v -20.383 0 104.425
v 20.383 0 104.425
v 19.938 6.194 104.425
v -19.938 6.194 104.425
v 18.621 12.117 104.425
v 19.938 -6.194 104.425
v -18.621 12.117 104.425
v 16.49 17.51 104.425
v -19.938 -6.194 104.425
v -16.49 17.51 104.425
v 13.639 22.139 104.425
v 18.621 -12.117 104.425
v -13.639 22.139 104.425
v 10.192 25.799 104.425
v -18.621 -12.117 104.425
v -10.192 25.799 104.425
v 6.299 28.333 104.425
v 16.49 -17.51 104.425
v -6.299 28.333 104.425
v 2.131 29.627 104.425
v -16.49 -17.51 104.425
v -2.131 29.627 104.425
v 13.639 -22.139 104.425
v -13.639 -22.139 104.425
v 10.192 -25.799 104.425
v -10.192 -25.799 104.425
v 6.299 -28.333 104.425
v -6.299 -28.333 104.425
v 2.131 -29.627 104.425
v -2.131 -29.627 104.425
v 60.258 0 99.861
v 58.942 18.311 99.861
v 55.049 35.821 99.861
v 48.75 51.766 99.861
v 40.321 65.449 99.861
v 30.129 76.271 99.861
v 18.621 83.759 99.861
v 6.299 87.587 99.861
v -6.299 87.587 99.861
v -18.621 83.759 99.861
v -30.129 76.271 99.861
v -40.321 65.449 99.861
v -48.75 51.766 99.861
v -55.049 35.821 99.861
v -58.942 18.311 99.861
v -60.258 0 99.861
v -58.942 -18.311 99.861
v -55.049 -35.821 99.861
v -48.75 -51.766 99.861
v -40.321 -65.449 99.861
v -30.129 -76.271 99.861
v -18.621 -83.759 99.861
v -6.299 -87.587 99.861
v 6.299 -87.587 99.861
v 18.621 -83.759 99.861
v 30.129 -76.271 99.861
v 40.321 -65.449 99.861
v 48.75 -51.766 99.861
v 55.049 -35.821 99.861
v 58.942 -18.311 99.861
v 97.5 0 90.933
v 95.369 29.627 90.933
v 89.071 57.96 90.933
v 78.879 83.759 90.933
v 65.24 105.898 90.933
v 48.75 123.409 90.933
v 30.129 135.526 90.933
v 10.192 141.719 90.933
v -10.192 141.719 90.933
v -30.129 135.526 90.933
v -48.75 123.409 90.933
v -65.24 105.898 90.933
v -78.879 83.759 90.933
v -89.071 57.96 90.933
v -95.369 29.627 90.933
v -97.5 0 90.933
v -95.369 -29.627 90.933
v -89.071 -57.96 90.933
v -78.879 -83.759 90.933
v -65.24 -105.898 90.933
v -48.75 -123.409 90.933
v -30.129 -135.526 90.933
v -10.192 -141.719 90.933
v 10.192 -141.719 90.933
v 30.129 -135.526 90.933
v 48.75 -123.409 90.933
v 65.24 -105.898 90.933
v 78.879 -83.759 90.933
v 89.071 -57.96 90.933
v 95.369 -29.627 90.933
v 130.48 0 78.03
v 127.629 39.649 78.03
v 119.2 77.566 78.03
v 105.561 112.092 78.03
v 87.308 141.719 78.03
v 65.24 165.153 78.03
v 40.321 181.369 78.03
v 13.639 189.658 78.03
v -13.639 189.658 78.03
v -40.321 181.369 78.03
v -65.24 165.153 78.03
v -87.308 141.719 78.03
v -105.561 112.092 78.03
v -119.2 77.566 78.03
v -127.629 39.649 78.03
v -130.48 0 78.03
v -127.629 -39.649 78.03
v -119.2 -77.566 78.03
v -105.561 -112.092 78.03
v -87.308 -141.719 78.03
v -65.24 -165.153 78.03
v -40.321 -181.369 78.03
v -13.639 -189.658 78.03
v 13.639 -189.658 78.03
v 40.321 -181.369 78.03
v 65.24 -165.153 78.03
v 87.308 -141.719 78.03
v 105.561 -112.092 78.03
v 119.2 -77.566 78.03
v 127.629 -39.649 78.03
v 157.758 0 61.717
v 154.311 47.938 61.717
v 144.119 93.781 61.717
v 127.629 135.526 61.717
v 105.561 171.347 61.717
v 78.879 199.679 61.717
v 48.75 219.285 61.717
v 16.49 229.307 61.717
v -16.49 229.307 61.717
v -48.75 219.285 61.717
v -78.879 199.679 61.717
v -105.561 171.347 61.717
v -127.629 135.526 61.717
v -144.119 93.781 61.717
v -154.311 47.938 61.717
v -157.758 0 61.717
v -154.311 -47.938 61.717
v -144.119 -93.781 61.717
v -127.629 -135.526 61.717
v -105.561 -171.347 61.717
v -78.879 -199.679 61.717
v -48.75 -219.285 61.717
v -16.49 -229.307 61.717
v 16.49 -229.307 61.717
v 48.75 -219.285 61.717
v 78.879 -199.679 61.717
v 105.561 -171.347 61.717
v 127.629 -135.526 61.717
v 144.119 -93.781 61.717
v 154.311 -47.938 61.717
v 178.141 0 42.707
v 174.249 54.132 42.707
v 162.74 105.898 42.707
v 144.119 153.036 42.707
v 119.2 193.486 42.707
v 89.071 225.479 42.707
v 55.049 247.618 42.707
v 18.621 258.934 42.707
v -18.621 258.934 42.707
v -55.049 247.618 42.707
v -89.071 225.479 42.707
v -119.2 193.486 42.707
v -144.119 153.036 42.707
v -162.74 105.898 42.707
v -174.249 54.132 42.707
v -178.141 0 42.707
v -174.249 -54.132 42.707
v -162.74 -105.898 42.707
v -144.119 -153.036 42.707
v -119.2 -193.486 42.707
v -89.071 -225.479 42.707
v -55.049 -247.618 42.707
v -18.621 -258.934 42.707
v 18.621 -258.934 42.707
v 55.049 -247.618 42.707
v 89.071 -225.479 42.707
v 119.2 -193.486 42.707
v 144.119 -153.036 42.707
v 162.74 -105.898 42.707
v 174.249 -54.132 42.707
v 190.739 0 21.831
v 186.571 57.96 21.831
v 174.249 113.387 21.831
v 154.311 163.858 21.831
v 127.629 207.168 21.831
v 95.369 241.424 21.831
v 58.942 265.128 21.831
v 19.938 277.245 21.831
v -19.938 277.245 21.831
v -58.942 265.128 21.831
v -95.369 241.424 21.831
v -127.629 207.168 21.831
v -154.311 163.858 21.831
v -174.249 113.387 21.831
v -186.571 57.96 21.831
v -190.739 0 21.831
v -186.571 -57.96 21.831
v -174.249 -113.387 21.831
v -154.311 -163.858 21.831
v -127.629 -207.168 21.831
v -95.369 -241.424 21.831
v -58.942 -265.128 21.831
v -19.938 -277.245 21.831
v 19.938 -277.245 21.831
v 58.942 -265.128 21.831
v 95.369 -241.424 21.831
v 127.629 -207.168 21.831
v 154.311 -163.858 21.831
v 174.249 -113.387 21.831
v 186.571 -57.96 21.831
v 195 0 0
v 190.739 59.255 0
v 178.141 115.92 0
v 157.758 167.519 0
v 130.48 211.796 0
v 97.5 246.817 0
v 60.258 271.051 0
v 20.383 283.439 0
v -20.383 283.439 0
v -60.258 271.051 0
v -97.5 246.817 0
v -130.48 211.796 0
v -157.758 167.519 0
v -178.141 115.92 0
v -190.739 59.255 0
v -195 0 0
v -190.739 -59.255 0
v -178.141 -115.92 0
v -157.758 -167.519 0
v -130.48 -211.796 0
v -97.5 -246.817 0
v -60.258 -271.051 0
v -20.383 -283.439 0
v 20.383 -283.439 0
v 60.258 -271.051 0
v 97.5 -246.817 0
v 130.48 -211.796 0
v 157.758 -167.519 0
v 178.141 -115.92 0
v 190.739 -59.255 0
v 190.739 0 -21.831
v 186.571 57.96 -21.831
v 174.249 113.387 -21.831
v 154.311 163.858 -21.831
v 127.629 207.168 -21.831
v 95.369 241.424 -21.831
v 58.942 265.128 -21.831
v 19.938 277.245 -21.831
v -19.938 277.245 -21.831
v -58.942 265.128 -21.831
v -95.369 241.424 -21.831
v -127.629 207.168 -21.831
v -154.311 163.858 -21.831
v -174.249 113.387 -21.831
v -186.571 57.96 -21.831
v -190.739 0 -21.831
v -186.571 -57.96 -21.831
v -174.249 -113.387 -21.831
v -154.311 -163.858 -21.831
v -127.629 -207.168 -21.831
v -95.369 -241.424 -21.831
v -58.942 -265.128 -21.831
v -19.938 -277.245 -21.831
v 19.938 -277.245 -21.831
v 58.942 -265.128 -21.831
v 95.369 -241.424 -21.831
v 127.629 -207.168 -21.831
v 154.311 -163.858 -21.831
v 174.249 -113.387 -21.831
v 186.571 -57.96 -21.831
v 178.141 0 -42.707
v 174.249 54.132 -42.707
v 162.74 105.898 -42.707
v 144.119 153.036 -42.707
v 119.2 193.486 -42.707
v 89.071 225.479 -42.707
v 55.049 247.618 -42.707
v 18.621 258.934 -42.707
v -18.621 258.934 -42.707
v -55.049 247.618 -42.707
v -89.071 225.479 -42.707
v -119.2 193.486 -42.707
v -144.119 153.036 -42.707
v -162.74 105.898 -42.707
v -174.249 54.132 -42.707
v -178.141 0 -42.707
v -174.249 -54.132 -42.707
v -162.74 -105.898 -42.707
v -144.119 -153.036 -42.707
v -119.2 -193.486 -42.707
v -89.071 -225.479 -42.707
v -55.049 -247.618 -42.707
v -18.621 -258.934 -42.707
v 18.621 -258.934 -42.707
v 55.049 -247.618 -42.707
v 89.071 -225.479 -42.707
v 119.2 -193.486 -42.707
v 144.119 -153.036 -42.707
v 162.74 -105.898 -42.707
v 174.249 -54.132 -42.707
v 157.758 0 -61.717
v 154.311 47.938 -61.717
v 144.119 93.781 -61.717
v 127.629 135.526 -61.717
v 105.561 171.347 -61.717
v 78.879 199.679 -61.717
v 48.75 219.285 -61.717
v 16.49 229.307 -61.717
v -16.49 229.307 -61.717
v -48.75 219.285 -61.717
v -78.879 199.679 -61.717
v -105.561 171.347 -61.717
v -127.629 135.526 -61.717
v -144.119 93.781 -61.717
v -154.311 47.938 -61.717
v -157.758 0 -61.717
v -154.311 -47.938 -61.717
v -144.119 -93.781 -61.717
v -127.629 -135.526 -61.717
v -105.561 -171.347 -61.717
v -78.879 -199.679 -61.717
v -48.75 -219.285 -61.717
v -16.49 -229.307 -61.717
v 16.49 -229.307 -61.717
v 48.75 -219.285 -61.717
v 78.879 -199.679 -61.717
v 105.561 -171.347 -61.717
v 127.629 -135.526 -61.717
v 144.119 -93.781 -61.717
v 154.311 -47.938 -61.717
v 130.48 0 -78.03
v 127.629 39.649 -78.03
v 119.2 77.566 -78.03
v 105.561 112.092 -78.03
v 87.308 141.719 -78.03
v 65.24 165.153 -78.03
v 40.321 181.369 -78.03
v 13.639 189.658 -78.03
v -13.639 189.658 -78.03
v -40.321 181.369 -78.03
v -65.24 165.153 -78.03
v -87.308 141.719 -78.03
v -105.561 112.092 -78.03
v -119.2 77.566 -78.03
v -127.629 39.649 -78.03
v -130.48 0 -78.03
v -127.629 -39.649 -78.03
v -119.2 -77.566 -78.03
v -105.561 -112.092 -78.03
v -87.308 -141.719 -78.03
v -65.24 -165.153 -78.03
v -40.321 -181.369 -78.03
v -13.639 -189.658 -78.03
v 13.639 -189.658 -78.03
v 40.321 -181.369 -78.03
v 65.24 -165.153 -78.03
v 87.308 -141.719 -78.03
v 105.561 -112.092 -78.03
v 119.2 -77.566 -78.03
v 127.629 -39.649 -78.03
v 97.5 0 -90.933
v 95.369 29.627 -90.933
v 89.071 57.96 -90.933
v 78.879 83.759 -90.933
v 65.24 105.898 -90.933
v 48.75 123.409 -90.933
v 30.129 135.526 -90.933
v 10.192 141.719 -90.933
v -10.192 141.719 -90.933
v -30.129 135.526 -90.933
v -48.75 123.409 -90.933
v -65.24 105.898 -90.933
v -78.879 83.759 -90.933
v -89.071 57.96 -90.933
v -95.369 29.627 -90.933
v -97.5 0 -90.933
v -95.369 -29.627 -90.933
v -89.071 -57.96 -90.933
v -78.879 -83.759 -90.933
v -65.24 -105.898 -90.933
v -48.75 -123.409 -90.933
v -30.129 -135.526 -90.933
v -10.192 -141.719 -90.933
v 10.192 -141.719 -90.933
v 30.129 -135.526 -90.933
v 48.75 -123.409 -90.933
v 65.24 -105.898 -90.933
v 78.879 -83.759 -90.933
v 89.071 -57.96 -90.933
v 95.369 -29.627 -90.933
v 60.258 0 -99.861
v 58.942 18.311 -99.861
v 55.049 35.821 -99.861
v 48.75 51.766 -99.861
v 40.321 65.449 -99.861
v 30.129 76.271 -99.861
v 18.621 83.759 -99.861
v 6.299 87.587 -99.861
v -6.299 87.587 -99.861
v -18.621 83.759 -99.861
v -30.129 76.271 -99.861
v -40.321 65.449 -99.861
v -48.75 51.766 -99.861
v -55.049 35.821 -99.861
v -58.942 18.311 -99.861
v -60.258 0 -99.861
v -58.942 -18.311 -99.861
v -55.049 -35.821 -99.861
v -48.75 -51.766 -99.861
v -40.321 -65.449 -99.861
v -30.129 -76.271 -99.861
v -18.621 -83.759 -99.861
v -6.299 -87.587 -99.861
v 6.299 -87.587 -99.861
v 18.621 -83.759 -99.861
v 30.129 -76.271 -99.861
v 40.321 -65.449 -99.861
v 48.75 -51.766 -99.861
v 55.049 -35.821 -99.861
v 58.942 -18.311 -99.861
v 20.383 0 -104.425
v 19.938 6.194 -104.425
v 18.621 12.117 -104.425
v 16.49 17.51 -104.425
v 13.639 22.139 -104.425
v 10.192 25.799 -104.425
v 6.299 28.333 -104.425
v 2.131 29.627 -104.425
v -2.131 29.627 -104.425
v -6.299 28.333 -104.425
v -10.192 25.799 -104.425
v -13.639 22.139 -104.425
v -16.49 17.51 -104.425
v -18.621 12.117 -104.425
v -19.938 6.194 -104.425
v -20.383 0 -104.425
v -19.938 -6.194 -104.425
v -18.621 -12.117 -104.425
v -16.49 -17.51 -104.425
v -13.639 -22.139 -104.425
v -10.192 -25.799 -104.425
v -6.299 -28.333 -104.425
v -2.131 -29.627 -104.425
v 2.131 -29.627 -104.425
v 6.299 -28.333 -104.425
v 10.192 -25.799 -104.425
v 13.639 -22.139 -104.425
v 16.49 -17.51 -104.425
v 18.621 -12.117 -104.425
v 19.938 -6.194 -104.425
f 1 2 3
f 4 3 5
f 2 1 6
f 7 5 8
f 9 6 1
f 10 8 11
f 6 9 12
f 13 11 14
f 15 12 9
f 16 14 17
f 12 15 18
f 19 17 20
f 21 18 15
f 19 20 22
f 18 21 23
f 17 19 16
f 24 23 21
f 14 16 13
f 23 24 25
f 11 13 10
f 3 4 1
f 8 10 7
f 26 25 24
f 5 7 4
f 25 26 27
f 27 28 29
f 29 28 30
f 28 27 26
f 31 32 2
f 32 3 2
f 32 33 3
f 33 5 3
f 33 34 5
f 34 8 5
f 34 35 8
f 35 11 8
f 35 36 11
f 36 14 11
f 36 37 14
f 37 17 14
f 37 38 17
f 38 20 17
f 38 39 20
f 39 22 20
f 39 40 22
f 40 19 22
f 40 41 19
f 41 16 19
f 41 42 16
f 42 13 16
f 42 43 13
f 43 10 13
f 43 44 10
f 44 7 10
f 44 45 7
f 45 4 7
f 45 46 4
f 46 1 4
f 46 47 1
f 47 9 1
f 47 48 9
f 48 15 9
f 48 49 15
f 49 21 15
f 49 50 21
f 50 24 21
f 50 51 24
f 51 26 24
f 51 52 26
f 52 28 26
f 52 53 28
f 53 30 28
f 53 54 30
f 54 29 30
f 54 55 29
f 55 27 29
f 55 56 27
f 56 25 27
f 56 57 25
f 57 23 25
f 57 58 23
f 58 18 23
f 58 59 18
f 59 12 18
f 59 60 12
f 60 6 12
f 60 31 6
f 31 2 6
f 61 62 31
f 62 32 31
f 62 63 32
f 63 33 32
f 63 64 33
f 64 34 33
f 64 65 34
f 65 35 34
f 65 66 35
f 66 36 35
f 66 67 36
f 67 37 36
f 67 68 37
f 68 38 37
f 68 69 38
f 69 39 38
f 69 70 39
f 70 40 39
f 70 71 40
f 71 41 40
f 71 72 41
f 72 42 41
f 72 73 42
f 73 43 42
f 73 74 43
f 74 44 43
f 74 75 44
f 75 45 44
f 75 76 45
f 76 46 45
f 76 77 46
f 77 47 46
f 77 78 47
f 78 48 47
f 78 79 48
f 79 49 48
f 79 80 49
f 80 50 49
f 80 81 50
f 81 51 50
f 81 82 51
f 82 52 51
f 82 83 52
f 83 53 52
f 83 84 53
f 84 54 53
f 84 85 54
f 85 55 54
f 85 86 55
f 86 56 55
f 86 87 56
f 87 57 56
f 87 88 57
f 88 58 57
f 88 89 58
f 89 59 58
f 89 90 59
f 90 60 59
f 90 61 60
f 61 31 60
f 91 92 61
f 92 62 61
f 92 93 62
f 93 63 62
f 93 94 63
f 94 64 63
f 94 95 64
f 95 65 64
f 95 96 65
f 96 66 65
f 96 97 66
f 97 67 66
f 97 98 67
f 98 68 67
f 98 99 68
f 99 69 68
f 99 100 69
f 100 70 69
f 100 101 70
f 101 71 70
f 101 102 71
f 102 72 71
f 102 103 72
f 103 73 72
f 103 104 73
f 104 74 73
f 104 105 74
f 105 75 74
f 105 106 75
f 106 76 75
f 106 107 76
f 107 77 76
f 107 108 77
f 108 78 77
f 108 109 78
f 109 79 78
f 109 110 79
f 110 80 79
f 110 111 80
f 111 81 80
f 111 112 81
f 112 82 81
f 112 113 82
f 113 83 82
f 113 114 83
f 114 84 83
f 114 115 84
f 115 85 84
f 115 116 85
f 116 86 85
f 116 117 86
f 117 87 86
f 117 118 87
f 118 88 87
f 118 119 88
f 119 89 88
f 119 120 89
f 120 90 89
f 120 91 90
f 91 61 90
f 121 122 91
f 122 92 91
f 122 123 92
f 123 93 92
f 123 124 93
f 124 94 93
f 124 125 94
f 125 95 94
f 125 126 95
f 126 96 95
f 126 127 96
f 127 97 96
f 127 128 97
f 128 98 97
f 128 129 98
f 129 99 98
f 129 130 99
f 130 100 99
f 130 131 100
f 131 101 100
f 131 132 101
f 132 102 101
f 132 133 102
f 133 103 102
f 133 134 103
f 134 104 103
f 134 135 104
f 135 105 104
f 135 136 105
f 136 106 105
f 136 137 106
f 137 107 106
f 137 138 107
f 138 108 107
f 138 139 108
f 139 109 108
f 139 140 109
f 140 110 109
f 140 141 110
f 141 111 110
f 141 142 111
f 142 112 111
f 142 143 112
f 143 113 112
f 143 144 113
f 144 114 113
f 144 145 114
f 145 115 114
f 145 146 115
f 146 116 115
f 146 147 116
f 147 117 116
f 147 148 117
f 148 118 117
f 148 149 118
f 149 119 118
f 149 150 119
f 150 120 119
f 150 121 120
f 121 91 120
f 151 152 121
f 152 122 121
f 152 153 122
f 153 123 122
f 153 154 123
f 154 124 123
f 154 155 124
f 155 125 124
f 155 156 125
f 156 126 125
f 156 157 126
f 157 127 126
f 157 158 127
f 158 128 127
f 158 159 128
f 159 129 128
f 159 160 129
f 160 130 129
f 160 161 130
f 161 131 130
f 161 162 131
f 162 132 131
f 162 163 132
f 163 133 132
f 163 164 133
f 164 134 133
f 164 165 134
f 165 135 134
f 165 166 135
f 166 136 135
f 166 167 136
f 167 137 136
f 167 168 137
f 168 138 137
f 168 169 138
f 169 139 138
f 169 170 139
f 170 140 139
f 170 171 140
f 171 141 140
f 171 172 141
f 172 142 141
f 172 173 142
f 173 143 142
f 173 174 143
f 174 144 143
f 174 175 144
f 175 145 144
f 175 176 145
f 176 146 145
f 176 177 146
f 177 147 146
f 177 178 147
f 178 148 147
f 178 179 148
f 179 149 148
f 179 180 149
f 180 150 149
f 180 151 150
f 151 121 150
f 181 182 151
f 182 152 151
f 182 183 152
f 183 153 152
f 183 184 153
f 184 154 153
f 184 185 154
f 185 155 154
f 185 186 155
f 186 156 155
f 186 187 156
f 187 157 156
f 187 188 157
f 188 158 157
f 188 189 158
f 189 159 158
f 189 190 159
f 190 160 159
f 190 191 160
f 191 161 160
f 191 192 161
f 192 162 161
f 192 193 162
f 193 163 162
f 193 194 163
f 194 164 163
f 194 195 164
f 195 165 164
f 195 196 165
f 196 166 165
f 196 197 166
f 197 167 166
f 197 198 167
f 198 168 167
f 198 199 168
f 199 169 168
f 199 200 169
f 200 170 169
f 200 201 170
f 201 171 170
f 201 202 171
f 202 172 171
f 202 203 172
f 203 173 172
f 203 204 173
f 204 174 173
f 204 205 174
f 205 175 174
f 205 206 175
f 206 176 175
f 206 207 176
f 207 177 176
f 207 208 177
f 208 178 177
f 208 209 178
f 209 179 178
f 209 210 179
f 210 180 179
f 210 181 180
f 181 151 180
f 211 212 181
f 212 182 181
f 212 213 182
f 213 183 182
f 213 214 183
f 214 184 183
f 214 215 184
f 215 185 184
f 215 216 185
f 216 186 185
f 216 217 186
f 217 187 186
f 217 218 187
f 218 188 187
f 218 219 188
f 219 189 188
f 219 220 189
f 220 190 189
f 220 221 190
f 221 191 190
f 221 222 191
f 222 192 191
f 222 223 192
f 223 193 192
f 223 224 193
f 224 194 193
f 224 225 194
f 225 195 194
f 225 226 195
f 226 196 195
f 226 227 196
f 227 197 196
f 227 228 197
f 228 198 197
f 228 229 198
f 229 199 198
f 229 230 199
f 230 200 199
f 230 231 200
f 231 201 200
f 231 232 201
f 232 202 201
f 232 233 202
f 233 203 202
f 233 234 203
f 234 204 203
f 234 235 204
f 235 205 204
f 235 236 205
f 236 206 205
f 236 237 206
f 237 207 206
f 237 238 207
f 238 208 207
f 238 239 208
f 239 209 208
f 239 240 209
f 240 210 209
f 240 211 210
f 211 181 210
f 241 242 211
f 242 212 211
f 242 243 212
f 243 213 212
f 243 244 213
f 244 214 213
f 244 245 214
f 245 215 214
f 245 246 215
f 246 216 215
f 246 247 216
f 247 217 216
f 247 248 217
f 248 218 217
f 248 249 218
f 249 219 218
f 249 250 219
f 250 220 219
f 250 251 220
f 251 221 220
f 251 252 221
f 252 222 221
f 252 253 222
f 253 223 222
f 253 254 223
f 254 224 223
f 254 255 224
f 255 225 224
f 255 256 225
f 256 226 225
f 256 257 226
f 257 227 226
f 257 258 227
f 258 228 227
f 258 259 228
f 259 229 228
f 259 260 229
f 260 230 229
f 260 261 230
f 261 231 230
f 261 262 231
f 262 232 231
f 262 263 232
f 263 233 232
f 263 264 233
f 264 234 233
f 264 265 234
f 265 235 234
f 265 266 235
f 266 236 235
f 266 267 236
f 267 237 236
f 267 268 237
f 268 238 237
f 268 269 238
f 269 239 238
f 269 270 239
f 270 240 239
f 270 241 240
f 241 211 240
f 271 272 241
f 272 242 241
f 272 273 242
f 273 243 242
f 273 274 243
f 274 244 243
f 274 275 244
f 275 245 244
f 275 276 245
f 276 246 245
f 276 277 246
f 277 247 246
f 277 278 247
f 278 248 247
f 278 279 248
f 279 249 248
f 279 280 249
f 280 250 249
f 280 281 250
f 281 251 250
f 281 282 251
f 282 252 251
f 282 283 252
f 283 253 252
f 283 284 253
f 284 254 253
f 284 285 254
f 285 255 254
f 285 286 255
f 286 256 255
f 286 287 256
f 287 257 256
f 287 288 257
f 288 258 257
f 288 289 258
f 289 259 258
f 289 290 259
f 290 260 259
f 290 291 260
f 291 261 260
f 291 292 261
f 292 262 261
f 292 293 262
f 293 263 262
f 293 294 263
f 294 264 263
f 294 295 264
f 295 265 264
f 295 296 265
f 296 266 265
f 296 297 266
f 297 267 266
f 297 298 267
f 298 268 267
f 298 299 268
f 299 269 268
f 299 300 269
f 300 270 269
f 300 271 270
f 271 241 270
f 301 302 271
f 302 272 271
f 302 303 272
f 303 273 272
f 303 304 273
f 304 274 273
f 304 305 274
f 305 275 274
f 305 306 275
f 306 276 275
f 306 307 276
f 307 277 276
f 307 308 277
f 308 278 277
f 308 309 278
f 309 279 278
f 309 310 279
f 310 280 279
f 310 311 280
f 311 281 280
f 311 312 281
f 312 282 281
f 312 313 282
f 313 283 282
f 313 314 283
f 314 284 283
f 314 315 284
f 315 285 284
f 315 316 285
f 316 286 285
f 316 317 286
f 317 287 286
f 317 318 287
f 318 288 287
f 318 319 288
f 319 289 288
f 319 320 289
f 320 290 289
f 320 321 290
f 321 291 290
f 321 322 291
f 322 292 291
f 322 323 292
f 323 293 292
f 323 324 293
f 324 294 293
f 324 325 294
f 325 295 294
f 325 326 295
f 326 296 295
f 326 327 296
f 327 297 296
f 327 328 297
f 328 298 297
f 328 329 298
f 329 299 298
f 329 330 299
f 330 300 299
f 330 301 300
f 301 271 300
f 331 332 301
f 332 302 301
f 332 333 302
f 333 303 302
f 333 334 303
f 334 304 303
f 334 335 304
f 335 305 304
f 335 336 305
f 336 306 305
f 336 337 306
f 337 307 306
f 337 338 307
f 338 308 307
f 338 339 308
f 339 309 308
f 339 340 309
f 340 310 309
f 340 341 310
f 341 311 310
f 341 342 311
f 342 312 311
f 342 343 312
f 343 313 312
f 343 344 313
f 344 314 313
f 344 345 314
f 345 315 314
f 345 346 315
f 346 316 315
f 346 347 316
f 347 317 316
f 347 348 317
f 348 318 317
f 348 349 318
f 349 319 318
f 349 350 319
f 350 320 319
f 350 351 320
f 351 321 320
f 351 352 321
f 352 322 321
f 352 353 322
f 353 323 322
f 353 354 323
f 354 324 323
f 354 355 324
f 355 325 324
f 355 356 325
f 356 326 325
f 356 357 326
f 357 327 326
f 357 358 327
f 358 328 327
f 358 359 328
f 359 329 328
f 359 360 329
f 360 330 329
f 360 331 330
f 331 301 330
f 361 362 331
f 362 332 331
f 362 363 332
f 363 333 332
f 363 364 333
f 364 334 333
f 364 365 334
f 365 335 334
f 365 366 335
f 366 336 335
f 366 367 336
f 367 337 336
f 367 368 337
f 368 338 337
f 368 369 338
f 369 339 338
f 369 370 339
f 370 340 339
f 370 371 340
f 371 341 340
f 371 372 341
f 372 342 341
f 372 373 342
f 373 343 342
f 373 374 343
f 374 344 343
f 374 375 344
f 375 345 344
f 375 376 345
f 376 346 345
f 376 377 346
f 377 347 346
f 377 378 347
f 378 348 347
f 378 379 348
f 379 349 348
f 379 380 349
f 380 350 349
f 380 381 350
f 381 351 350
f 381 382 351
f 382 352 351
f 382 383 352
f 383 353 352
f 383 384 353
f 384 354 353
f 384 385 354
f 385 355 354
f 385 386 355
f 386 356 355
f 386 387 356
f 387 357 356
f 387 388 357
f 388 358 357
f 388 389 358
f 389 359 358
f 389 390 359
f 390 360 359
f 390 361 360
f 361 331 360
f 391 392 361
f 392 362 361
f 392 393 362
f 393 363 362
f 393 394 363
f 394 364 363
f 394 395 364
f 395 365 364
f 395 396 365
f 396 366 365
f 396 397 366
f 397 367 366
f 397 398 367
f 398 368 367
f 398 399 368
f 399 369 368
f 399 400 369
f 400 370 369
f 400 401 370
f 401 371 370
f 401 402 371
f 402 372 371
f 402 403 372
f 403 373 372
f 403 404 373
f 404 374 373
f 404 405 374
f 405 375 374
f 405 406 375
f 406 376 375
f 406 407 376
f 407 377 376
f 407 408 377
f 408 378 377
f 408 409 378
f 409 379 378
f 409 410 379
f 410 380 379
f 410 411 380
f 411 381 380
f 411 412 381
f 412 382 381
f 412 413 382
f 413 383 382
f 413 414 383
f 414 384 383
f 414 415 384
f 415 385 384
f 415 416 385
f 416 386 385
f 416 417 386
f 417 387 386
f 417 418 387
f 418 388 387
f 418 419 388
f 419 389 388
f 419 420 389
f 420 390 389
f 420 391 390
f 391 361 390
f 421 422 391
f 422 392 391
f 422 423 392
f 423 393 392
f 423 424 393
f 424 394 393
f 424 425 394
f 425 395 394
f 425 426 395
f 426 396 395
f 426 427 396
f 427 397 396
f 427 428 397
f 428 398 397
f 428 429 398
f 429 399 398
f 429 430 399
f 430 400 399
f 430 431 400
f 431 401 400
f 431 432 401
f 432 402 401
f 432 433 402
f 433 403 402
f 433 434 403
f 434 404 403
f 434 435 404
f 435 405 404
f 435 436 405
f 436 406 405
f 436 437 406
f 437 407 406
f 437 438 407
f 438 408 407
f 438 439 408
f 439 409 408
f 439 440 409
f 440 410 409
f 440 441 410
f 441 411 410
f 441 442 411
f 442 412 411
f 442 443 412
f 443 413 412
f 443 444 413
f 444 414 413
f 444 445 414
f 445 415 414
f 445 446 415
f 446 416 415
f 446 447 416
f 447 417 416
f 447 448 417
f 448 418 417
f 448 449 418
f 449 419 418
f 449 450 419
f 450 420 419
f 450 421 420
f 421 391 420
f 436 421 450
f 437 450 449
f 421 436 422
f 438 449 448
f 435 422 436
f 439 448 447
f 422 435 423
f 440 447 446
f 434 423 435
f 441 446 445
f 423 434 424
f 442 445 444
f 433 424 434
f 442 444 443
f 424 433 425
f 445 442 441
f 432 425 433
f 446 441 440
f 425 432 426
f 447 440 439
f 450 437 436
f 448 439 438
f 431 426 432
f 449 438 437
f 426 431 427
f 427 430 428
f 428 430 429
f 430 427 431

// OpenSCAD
// Generated by SolidPython 1.0.1 on 2020-07-29 00:46:51


scale(v = [13, 19, 7]) {
	sphere(r = 15);
}
/***********************************************
*********      SolidPython code:      **********
************************************************
 
# import packages: SolidPython
from solid import *
from solid.utils import *
from itertools import chain, combinations, permutations


class Resize:

    def __init__(self, scad_file):
        self.scad_file = scad_file
        #self.scad_file = import_scad(scad_file)
        # cone/cylinder param:
        self.r1 = 0
        self.r2 = 0
        self.h = 0
        # rectangular prism param:
        self.w = 0
        self.l = 0
        # ellipse param:
        self.r = 0

    # import OpenScad code (file name corresponds to shape)


    # classify shape + parameters
    def assign(self, param1, param2, param3):
        if self.scad_file == 'cone.scad':
            self.r1 = param1
            self.r2 = param2
            self.h = param3
        elif self.scad_file == 'cylinder.scad':
            self.r1 = param1
            self.r2 = param2
            self.h = param3
        elif self.scad_file == 'rectangularPrism.scad':
            self.h = param1
            self.l = param2
            self.w = param3
        else:
            self.r = param1
            self.h = param2

    # resize parameters
    def iterate(self):
        x = range(3, 20, 2)
        i = 1
        if self.scad_file == 'cone.scad':
            tempList = list(permutations(x, 2))
            for temp in tempList:
                param1 = temp[0]
                param2 = temp[1]
                filepath = 'produced_scad_files/' + 'cone' + str(param1) + '_' + str(param2) + '_' + '.scad'
                scad_render_to_file(cylinder(h=param1, r1=param2, r2=0), filepath)

        elif self.scad_file == 'cylinder.scad':
            tempList = list(permutations(x, 3))
            for temp in tempList:
                param1 = temp[0]
                param2 = temp[1]
                filepath = 'produced_scad_files/' + 'cylinder' + str(param1) + '_' + str(param2) + '_' + '.scad'
                scad_render_to_file(cylinder(h=param1, r1=param2, r2=param2), filepath)

        elif self.scad_file == 'rectangularPrism.scad':
            tempList = list(permutations(x, 3))
            for temp in tempList:
                param1 = temp[0]
                param2 = temp[1]
                param3 = temp[2]
                filepath = 'produced_scad_files/' + 'rectangularPrism' + str(param1) + '_' + str(param2) + '_' + str(
                    param3) + '.scad'
                scad_render_to_file(cube(size=(param1, param2, param3)), filepath)

        elif self.scad_file == 'ellipse.scad':
            tempList = list(permutations(x, 4))
            for temp in tempList:
                param1 = temp[0]
                param2 = temp[1]
                param3 = temp[2]
                param4 = temp[3]
                filepath = 'produced_scad_files/' + 'ellipse' + str(param1) + '_' + str(param2) + '_' + str(param3) + '_' + str(param4) + '.scad'
                scad_render_to_file(scale([param1, param2, param3])(sphere(r=param4)), filepath)

    def render_to_scadfile(self):
        scad_render_to_file(scad, 'example.scad') 
 
************************************************/
